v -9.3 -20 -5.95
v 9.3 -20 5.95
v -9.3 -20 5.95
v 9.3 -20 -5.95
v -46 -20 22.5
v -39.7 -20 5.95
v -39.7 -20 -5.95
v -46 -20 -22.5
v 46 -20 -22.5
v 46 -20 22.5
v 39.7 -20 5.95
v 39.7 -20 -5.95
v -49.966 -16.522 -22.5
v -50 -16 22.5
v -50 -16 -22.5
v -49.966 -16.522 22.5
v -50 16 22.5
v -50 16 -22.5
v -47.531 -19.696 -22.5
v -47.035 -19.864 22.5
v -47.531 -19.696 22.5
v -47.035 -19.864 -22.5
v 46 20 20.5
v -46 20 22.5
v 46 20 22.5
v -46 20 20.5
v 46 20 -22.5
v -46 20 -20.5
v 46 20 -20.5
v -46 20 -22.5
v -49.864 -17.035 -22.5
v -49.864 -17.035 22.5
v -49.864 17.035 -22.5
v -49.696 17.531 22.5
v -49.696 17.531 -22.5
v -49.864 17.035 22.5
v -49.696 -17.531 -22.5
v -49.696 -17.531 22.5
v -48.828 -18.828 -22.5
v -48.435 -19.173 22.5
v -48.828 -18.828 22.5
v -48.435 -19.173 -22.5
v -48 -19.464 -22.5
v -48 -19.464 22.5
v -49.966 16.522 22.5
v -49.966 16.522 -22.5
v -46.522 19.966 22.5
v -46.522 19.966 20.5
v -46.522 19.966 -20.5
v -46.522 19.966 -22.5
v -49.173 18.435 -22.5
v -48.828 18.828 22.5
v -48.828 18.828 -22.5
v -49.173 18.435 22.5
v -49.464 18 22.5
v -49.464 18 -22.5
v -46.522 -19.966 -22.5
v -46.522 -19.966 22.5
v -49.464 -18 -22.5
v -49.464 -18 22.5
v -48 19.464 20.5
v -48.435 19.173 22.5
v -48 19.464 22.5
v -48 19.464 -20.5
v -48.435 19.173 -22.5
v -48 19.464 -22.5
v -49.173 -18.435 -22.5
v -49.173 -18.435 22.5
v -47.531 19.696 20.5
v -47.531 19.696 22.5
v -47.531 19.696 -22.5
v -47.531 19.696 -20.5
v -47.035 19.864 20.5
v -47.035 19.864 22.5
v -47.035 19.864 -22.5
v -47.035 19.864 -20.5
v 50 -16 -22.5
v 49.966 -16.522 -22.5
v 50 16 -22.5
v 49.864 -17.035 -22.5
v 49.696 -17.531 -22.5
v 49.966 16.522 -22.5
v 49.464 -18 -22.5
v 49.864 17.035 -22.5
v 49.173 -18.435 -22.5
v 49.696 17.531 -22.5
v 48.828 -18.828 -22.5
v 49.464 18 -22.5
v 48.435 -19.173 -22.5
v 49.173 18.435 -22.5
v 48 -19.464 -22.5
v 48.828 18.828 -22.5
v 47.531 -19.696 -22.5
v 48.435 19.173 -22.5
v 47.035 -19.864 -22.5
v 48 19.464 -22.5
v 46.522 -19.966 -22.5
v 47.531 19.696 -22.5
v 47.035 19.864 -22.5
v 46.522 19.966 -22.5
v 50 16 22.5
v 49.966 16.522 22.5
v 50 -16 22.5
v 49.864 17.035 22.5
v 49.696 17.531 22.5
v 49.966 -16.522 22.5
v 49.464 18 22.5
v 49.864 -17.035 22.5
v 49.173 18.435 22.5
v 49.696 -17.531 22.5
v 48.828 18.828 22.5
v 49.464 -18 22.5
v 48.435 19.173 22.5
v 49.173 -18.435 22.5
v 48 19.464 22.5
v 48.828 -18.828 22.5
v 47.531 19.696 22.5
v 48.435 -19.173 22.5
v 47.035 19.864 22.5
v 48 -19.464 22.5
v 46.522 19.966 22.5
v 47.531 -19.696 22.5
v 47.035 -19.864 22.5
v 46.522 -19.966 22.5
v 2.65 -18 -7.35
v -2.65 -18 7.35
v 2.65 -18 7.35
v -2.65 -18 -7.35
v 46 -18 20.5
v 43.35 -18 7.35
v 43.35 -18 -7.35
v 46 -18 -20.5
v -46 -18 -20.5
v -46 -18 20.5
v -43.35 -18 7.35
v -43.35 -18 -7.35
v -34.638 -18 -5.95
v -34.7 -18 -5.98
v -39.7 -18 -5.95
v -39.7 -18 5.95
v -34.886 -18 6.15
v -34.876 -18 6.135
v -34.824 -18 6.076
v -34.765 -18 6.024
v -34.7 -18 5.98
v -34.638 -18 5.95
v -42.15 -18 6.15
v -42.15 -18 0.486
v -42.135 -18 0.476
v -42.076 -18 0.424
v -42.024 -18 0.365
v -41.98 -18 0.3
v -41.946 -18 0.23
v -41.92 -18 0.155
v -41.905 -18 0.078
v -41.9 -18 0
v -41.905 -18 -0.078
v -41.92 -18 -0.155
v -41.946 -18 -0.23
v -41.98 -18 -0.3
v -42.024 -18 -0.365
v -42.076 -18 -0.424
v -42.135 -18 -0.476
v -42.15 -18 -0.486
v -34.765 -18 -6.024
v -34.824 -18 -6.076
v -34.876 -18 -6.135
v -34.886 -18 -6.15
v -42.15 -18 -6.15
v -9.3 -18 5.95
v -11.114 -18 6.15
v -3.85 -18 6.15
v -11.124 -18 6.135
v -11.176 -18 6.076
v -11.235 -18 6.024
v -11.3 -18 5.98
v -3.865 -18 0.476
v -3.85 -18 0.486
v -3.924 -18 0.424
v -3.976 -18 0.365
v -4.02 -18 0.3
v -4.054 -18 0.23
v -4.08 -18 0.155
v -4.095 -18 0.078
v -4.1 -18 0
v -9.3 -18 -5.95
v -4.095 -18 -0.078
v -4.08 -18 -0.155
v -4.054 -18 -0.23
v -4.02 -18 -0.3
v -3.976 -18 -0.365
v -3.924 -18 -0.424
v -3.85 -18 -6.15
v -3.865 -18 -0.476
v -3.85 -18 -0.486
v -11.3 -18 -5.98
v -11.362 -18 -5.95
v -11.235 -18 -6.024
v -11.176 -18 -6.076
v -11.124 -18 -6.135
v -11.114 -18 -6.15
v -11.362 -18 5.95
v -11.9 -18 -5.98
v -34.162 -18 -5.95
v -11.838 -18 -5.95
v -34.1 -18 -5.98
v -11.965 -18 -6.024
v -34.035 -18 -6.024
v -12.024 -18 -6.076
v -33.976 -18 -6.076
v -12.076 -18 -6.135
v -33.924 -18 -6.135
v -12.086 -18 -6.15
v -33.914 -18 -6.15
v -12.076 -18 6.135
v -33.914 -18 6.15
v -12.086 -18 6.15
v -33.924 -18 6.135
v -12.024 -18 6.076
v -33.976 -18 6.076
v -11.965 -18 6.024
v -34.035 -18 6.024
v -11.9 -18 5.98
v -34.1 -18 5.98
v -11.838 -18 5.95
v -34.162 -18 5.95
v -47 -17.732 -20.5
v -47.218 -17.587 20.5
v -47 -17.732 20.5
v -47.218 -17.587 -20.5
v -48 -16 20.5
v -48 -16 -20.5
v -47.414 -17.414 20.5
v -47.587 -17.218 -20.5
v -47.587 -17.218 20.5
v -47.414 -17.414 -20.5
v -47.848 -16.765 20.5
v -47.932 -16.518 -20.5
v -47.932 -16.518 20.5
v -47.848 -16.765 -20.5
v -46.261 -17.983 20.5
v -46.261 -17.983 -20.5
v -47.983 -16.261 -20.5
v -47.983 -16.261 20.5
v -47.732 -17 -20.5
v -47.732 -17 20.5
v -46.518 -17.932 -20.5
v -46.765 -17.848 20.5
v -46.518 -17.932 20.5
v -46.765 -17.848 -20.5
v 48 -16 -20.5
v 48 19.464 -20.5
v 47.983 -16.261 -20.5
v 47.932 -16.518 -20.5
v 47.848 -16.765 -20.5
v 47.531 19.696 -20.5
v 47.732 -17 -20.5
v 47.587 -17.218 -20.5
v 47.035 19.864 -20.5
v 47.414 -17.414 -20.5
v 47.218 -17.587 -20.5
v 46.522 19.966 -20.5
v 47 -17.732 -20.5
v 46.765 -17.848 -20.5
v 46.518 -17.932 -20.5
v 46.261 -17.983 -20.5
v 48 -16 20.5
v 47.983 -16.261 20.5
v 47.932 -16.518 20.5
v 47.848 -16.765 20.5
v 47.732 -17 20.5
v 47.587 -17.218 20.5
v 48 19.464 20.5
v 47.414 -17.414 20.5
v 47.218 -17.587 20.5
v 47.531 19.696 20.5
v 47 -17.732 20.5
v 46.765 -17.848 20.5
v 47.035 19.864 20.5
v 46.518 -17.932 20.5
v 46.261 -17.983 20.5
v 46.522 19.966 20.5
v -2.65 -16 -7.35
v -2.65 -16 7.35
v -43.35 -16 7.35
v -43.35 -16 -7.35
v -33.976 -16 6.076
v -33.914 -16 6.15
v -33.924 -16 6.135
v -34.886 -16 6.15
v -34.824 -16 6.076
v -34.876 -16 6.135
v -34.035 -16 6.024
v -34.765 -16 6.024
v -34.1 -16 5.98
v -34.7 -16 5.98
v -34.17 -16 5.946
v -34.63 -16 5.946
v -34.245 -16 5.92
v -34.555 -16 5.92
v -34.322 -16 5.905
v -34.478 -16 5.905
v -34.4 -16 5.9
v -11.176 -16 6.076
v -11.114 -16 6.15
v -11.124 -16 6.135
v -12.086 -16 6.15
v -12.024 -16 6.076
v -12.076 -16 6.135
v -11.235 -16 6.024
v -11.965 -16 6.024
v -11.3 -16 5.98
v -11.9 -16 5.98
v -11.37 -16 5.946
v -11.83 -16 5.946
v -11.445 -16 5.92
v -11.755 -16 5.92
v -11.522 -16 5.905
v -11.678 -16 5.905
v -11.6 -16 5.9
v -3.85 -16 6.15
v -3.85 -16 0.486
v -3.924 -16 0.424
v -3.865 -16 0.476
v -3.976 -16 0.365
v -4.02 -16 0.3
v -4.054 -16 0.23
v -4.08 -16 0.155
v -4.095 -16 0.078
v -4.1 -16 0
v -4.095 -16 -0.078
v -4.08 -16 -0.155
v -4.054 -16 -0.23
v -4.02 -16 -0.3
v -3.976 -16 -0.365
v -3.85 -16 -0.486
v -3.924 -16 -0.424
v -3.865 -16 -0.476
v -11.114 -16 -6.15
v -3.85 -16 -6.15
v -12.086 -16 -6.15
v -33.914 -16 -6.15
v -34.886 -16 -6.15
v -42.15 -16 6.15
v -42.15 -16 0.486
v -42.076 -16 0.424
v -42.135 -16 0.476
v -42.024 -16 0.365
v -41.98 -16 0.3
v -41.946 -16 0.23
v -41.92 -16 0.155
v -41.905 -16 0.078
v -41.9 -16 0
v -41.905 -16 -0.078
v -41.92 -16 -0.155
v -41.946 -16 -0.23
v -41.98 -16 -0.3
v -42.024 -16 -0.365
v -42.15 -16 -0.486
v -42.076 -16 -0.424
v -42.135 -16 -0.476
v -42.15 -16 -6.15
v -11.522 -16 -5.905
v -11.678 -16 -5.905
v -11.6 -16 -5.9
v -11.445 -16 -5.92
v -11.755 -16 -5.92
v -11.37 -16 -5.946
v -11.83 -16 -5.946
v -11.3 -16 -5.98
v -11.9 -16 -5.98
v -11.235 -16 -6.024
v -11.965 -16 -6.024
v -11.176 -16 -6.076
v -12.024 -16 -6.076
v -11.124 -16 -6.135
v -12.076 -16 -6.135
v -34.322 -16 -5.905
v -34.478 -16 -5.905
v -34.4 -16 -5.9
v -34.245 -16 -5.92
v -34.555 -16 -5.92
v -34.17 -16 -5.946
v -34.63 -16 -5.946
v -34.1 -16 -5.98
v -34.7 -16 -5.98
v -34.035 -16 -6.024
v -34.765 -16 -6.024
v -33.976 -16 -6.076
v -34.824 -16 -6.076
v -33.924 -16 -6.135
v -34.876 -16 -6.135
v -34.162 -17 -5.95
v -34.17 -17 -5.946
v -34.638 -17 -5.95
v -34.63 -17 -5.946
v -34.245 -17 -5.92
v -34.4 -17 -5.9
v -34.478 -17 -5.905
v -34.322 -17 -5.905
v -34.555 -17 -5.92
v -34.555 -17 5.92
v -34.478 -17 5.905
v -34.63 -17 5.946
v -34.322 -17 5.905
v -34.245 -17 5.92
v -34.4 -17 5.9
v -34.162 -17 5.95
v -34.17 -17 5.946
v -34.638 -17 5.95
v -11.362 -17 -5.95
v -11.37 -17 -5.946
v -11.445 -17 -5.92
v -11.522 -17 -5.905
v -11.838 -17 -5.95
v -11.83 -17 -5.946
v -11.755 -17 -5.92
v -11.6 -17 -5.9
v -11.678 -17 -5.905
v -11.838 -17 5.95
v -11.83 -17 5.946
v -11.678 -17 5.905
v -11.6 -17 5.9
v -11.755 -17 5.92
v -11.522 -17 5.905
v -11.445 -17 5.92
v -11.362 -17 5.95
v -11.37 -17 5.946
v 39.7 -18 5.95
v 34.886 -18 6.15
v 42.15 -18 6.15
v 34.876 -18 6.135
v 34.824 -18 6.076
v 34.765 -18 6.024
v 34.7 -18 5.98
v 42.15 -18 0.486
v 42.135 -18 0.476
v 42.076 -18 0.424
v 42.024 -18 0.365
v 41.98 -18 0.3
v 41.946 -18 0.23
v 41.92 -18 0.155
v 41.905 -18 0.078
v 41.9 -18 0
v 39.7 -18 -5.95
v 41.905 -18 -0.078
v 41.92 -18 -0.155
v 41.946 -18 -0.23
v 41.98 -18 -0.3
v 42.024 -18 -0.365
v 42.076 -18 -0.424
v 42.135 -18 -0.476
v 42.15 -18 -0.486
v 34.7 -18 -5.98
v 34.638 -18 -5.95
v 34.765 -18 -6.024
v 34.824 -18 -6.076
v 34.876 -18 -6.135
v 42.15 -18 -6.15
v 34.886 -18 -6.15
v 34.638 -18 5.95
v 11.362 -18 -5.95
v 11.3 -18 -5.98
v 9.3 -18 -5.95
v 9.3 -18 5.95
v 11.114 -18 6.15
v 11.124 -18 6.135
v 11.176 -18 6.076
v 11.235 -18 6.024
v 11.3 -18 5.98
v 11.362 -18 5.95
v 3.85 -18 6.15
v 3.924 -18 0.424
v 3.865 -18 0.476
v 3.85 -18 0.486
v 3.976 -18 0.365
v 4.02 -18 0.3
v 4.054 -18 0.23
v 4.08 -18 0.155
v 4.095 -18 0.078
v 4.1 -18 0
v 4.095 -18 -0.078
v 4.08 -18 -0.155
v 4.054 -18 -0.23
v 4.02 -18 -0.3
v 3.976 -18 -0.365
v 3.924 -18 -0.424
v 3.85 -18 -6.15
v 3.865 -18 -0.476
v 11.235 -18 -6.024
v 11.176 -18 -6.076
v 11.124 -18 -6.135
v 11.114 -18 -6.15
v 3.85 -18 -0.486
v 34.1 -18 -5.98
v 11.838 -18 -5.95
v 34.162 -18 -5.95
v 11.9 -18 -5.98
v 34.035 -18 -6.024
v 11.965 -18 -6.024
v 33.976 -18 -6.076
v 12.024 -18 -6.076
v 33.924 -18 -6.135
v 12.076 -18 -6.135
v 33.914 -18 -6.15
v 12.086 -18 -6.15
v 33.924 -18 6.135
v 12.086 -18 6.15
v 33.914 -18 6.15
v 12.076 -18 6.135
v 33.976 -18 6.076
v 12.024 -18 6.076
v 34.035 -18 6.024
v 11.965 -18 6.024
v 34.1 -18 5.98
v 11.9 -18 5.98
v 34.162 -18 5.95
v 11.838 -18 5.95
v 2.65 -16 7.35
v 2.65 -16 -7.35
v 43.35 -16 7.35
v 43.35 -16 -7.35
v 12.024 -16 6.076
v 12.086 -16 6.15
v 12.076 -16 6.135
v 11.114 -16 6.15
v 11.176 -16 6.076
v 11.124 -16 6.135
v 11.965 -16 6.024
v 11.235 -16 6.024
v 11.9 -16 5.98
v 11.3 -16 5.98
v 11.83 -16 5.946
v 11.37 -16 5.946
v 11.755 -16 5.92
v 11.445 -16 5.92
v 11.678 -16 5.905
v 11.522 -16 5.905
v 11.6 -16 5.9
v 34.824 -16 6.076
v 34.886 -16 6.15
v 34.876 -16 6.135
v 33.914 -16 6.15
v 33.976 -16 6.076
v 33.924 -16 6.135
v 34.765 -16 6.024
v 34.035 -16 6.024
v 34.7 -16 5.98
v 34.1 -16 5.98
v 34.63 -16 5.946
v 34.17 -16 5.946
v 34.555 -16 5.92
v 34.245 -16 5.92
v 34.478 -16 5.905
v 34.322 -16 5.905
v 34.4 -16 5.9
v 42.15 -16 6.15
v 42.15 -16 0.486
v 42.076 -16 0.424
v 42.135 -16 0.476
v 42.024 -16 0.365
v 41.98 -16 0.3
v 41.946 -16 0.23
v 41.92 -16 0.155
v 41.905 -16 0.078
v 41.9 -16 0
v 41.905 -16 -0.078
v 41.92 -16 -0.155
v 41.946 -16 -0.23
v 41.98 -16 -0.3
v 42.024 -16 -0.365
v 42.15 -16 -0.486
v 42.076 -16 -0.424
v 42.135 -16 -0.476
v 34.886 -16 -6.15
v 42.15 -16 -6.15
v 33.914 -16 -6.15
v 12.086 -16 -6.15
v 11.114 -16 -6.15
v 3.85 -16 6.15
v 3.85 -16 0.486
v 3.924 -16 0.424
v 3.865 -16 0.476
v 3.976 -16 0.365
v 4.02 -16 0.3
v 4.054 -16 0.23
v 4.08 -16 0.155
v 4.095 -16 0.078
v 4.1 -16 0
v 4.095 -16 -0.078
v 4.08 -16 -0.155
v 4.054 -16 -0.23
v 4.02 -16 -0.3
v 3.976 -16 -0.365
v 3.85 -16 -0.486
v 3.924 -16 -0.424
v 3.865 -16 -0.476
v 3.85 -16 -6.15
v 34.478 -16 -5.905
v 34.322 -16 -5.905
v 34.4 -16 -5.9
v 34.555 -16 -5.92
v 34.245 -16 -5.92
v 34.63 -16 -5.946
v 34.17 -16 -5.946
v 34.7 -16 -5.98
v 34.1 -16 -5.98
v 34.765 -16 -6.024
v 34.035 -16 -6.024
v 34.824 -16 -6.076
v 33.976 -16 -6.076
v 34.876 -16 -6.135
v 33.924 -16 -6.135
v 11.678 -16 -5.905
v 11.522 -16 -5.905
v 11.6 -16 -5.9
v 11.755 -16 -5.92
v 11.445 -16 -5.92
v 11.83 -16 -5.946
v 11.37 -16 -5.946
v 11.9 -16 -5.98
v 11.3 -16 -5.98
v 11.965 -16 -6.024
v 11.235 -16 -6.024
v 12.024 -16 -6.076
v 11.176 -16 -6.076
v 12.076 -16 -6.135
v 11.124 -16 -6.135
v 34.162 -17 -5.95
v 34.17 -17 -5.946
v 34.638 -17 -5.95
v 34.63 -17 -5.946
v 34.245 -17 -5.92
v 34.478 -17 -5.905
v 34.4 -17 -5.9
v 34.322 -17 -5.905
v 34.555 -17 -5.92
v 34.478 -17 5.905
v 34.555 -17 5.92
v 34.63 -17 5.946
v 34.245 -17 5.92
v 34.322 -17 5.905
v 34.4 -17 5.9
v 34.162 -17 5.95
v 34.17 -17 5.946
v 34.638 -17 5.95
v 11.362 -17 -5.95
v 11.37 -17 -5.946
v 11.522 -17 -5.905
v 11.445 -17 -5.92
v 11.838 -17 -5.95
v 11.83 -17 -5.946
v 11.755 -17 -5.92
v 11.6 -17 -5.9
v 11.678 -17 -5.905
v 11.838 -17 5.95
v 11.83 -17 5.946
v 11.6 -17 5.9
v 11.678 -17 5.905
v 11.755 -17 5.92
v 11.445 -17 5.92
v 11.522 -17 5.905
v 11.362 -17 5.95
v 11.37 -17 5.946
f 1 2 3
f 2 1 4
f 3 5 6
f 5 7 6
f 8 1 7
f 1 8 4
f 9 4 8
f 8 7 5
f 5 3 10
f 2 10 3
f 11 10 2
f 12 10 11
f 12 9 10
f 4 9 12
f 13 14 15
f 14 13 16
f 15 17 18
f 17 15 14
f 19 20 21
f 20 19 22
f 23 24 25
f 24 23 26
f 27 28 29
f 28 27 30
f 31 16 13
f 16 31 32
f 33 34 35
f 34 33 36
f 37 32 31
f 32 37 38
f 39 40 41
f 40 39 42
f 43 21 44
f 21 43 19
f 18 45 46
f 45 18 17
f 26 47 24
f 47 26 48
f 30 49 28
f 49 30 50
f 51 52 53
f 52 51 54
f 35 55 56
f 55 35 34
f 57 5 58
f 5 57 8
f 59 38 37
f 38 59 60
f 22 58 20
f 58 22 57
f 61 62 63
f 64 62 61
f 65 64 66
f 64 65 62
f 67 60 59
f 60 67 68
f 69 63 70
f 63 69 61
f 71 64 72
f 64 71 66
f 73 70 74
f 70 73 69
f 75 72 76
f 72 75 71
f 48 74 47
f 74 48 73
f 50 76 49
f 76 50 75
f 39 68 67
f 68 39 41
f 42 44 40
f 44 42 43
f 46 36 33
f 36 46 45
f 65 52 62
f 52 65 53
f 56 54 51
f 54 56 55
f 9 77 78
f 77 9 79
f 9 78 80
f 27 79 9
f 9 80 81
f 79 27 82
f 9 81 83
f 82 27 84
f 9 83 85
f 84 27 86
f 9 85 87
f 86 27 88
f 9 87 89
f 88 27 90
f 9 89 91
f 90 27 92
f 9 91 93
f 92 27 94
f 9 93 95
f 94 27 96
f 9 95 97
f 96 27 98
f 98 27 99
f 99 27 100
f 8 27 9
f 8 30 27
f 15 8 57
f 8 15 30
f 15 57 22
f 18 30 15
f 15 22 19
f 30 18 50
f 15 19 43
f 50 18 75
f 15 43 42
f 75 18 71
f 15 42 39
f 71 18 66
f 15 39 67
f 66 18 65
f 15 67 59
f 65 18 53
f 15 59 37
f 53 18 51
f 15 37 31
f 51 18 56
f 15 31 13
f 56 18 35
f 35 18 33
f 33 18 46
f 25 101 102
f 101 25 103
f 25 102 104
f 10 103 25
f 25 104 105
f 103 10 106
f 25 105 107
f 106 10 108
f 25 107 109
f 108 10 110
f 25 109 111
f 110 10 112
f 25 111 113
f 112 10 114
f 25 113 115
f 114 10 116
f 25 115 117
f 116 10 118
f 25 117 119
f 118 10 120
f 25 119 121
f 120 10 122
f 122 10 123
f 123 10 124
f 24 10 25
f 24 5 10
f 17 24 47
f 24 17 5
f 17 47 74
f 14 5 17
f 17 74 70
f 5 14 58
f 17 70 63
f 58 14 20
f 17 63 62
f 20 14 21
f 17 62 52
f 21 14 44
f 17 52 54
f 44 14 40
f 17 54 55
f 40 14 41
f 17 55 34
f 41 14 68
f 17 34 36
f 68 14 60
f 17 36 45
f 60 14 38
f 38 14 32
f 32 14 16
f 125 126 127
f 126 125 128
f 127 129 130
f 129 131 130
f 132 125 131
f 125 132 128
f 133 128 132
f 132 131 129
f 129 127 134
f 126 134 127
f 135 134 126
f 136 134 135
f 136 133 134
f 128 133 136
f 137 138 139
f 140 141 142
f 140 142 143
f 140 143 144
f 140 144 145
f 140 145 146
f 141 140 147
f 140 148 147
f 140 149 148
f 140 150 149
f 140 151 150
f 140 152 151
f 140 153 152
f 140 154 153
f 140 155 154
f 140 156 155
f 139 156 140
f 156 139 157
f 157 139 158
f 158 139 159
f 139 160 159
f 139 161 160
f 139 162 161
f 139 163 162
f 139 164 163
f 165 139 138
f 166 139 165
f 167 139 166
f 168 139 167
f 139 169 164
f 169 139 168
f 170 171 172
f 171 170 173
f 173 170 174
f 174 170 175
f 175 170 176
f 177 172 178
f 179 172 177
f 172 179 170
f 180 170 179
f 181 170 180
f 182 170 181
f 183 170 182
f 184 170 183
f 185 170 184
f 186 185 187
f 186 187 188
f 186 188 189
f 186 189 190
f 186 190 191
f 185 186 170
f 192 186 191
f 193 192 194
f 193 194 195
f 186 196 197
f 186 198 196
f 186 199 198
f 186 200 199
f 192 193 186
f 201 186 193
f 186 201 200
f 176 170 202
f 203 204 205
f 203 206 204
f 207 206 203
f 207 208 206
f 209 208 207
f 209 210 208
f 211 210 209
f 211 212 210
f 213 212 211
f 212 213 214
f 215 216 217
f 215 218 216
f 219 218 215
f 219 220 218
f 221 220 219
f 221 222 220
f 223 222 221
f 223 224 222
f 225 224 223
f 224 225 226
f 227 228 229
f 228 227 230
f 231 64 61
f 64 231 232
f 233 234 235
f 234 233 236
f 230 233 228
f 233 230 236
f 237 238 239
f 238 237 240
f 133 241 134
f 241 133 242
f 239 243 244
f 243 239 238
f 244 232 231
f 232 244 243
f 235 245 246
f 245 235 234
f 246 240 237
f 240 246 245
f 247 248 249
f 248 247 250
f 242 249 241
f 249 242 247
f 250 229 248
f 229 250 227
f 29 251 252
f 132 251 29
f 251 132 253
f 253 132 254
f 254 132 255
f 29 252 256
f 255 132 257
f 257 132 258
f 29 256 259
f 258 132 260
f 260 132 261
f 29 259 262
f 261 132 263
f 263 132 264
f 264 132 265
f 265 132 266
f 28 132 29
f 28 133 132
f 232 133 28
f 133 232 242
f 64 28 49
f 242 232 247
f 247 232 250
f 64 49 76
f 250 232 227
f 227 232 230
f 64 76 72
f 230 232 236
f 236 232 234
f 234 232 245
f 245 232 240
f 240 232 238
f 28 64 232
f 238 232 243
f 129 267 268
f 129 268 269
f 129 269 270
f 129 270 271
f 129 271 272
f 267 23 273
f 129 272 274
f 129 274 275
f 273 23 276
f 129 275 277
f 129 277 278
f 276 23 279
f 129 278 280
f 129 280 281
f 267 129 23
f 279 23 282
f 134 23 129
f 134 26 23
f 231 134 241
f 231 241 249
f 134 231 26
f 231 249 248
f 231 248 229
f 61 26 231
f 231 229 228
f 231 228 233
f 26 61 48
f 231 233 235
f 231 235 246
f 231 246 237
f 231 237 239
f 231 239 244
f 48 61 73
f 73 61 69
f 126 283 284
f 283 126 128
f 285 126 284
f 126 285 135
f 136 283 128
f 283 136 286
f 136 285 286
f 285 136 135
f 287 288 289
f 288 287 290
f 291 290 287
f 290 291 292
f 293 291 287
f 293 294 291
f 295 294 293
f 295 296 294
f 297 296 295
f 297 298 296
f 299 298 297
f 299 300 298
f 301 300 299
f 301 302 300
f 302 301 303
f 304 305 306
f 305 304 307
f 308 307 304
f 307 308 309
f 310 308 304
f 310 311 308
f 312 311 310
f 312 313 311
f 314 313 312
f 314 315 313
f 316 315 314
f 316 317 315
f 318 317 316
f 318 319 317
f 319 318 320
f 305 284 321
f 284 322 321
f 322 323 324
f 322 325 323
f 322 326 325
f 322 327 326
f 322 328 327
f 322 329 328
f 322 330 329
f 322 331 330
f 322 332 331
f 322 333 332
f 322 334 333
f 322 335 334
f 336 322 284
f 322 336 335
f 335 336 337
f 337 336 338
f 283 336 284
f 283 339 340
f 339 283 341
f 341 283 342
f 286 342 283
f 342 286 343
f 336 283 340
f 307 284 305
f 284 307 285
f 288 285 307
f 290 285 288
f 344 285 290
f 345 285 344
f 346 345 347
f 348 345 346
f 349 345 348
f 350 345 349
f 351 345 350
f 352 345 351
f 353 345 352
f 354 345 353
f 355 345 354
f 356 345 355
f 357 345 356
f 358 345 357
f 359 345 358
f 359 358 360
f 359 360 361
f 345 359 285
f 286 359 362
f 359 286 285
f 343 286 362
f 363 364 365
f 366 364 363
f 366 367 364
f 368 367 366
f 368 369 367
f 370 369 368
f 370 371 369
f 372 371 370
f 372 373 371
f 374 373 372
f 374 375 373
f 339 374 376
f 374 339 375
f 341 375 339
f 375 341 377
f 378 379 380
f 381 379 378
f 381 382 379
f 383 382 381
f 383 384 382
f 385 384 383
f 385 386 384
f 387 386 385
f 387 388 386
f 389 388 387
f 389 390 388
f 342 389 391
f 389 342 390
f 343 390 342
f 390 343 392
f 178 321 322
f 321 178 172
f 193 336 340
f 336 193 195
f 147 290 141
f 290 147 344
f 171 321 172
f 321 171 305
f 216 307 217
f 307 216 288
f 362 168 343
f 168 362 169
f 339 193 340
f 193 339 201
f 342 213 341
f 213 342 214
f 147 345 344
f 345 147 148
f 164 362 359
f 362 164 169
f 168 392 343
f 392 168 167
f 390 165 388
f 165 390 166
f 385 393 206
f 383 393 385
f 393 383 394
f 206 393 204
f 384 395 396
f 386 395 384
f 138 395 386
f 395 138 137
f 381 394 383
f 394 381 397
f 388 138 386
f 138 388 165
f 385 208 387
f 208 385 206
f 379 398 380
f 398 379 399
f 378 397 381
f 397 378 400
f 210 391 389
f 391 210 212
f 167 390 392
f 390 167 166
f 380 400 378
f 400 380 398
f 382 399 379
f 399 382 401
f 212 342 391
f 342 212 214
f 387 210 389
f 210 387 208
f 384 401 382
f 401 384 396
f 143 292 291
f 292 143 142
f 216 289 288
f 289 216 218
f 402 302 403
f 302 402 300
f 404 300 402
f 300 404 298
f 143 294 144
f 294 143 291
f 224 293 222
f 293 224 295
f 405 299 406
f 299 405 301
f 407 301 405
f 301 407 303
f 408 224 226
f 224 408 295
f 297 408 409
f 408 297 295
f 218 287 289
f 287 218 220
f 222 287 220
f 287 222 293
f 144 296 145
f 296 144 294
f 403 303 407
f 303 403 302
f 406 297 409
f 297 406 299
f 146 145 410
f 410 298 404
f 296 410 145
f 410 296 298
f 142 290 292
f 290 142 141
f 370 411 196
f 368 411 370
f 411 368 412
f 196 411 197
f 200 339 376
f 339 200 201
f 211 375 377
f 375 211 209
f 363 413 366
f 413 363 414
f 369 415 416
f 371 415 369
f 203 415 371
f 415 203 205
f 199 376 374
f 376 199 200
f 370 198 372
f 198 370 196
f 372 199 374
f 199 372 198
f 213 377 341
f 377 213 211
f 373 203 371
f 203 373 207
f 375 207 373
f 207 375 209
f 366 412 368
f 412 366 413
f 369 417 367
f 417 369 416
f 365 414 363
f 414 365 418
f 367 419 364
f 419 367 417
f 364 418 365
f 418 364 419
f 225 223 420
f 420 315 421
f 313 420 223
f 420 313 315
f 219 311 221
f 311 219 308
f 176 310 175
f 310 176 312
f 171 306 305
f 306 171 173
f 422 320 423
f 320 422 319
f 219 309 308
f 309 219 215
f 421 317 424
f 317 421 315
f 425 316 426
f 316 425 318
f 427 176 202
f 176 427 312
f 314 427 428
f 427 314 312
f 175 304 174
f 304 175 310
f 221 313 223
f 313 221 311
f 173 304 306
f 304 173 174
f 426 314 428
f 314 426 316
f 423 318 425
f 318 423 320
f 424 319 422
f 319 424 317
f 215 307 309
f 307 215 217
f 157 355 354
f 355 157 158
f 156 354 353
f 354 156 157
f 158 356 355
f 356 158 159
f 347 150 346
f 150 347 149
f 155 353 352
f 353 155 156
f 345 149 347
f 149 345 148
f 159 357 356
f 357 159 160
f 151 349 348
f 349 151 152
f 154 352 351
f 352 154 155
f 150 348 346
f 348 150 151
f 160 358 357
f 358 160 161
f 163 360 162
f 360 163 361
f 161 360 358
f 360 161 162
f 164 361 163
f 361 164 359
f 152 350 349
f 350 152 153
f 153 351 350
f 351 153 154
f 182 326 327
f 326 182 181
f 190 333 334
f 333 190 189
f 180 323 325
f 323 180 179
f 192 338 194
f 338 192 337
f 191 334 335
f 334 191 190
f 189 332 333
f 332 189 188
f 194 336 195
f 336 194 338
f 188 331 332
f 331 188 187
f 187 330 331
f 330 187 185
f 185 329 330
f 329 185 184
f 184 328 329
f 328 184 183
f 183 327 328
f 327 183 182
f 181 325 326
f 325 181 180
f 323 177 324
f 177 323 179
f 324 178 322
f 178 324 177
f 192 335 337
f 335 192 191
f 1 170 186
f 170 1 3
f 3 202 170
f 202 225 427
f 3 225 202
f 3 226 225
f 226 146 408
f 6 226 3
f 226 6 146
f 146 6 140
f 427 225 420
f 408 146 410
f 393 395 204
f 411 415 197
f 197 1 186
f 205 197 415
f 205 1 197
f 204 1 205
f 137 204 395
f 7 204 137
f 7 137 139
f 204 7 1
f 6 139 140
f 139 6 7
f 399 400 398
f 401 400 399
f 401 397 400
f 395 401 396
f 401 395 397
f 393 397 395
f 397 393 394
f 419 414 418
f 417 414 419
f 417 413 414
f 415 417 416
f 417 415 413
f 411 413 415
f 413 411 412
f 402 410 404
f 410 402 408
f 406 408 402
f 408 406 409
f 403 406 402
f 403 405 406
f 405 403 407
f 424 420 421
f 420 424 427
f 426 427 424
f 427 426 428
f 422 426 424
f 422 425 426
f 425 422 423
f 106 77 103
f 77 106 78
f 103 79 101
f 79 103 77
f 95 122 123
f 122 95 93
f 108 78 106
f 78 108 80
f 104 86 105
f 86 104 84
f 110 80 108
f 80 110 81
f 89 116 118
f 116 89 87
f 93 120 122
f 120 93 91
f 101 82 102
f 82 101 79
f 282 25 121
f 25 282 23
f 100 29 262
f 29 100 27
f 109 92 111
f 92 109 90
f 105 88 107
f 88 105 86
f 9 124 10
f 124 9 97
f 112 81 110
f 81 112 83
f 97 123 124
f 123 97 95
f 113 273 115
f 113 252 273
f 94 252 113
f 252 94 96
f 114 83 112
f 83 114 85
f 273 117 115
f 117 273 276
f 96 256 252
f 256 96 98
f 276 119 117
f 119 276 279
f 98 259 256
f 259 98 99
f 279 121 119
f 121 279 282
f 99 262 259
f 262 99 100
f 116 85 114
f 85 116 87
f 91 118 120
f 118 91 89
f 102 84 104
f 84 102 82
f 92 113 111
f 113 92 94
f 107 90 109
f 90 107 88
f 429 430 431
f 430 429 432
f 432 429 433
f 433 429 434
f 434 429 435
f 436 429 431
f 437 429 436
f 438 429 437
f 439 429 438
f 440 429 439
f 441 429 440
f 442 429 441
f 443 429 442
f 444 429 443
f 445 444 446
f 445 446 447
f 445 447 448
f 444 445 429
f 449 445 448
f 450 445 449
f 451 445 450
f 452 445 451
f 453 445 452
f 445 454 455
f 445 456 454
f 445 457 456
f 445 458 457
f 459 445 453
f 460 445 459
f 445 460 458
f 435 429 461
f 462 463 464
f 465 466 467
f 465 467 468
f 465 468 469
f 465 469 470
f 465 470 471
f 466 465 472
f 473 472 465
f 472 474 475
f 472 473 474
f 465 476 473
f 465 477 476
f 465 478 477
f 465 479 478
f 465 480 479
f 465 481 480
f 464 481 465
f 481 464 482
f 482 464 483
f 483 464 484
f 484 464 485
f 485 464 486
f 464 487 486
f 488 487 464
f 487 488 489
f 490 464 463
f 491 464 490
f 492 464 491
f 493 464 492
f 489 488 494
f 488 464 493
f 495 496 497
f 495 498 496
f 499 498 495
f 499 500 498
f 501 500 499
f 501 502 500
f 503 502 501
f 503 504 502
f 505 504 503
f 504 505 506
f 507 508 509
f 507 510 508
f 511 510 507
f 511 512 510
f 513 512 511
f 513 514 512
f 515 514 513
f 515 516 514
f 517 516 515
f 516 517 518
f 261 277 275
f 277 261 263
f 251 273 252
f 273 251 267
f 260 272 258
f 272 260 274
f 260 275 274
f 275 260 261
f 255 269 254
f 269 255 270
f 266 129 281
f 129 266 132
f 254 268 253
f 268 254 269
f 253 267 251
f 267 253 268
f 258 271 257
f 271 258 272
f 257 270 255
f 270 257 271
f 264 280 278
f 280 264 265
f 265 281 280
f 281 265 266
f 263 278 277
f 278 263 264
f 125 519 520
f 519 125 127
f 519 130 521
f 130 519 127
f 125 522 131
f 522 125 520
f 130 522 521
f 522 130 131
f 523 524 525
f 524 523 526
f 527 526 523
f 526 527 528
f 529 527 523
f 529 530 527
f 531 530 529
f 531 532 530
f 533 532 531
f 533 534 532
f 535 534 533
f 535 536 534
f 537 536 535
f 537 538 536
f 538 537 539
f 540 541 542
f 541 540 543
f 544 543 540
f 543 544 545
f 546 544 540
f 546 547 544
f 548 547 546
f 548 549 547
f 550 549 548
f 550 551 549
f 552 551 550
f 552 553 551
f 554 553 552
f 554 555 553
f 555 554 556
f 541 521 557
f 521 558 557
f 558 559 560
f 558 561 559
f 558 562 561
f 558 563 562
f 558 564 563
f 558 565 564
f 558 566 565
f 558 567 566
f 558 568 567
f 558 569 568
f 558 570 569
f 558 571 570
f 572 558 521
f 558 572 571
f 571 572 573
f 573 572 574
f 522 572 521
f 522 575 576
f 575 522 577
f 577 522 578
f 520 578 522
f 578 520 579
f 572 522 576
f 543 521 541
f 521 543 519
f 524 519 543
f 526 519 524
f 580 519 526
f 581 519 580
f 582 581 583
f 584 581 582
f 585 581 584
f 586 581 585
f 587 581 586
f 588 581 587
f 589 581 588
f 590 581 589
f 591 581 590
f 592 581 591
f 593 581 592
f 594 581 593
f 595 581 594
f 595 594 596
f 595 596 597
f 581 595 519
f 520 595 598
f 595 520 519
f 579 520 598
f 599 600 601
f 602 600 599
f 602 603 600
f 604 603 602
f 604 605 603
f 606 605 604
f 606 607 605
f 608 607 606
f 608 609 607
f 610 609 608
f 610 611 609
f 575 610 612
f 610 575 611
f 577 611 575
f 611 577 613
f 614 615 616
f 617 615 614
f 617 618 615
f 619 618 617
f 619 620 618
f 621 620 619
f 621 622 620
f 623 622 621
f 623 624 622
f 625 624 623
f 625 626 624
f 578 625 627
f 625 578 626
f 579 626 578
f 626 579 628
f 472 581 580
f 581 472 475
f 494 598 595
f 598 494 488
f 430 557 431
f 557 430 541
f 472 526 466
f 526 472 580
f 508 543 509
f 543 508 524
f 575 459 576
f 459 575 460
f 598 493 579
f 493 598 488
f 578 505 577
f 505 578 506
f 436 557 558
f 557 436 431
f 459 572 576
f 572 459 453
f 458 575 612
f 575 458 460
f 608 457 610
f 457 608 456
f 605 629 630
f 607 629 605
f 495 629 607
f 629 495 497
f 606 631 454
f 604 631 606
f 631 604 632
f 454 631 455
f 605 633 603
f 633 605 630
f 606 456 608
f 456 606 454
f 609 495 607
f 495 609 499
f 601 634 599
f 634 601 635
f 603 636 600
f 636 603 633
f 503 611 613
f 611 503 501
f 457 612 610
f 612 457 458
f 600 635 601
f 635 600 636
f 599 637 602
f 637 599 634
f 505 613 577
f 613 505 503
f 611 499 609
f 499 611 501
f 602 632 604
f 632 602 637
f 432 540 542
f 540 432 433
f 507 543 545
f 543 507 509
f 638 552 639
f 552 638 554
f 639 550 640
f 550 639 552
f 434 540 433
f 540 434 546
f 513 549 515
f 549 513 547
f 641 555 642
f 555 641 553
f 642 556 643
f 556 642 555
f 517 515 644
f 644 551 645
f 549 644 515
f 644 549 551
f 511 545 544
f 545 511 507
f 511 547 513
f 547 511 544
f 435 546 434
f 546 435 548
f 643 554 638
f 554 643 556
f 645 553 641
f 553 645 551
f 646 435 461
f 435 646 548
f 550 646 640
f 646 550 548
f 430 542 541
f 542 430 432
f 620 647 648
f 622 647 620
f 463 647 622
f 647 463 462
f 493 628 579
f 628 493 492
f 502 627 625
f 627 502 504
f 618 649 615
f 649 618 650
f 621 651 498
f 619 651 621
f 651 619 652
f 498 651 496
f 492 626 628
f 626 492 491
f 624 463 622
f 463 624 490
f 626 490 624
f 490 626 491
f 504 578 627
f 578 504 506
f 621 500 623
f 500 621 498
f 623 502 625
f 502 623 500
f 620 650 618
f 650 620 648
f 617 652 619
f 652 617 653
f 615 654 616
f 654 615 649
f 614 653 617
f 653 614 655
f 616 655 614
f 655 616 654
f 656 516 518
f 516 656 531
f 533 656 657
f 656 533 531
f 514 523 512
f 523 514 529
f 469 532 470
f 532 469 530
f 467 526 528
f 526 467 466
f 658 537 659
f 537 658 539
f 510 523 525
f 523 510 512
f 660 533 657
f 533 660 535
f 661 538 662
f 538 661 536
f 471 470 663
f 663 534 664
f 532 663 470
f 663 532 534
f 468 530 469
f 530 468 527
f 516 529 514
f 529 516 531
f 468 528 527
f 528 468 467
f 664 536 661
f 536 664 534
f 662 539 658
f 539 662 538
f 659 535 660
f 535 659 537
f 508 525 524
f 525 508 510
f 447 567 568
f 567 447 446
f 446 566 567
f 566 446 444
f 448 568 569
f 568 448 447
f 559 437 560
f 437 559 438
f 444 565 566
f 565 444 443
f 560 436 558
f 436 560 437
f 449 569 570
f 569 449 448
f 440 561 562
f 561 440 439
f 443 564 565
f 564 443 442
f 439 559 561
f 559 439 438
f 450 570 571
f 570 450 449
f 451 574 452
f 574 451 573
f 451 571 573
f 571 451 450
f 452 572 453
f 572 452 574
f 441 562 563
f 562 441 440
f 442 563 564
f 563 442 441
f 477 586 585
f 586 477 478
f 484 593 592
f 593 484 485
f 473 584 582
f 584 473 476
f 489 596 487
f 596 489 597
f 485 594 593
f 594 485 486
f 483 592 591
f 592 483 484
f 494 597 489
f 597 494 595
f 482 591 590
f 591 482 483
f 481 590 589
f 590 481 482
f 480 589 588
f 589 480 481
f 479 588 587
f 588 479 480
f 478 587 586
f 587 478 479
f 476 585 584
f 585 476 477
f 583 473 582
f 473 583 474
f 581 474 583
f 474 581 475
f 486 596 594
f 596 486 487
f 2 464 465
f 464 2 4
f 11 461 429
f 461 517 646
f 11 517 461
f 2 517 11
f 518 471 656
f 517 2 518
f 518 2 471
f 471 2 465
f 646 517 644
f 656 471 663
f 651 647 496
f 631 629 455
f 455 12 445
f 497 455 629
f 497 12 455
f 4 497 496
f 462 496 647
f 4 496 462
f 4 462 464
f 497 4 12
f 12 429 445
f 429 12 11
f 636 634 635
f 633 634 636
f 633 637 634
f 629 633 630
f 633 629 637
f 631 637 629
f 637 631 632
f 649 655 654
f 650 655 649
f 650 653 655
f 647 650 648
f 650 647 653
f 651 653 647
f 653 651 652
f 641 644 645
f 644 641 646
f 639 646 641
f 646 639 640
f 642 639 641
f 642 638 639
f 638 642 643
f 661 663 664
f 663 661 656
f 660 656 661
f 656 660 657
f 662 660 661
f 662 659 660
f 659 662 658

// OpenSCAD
// DANTE case, step 1: a box with two press-fit windows for 0.91" SSD1306 128x32 OLEDs.
// All sizes in mm. Measure your modules with calipers and adjust the OLED block if they differ.
// The box is open at the back (a lid comes later). The front wall faces -Y.

/* [Box] */
box_w     = 100;   // outside width  (X)
box_h     = 45;    // outside height (Z)
box_d     = 40;    // outside depth  (Y)
wall      = 2.0;   // side/top/bottom walls
front     = 2.0;   // front wall thickness (glass is 1.4, so it sits ~0.6 behind the face)
corner_r  = 4;     // outside corner radius
eye_pitch = 46;    // centre-to-centre distance between the two screens
eye_z     = 0;     // vertical offset of the screens from the box centre

/* [OLED module: common 0.91" 128x32] */
pcb_w     = 38.0;  // PCB length (header end included)
pcb_h     = 12.0;  // PCB height
pcb_t     = 1.2;   // PCB thickness
glass_w   = 30.0;  // glass panel width
glass_h   = 11.5;  // glass panel height
glass_x   = -1.5;  // glass centre offset from PCB centre (away from the 4-pin header)

/* [Fit] */
window_clear = 0.20; // per side, glass to window: the glass never takes load
press        = 0.10; // interference per side on the PCB (0.05 tighter printers, 0.15 looser)
rib_w        = 1.2;  // retaining frame wall
rib_depth    = 2.0;  // frame height behind the front wall (≥ pcb_t)
bump_r       = 0.6;  // crush-bump radius on the frame (the part that actually grips)

$fn = 48;

module rounded_box(w, d, h, r) {
    hull() for (x = [-w/2 + r, w/2 - r], y = [-d/2 + r, d/2 - r])
        translate([x, y, -h/2]) cylinder(r = r, h = h);
}

// Shell: closed front, open back.
module shell() {
    difference() {
        rounded_box(box_w, box_d, box_h, corner_r);
        translate([0, front, 0])
            rounded_box(box_w - 2*wall, box_d, box_h - 2*wall, max(corner_r - wall, 0.5));
    }
}

// Glass window through the front wall, for one screen centred at x = cx.
module window_cut(cx) {
    translate([cx + glass_x - glass_w/2 - window_clear, -box_d/2 - 1,
               eye_z - glass_h/2 - window_clear])
        cube([glass_w + 2*window_clear, front + 2, glass_h + 2*window_clear]);
}

// Frame behind the front wall. The pocket is the PCB size plus a small gap, and
// half-round crush bumps reach into it by `press`, so the PCB snaps in and is held by friction.
module press_frame(cx) {
    gap = 0.15;                       // pocket clearance so only the bumps touch
    iw = pcb_w + 2*gap;  ih = pcb_h + 2*gap;
    y0 = -box_d/2 + front;            // inside face of the front wall
    translate([cx, y0, eye_z]) {
        difference() {
            translate([-iw/2 - rib_w, 0, -ih/2 - rib_w]) cube([iw + 2*rib_w, rib_depth, ih + 2*rib_w]);
            translate([-iw/2, -0.1, -ih/2]) cube([iw, rib_depth + 1, ih]);
        }
        // crush bumps: two on each long side, one on each short side
        bump_in = gap + press;
        for (fx = [-0.3, 0.3])
            for (sz = [-1, 1])
                translate([fx * pcb_w, 0, sz * (ih/2 + bump_r - bump_in)])
                    rotate([-90, 0, 0]) cylinder(r = bump_r, h = rib_depth);
        for (sx = [-1, 1])
            translate([sx * (iw/2 + bump_r - bump_in), 0, 0])
                rotate([-90, 0, 0]) cylinder(r = bump_r, h = rib_depth);
    }
}

module case_body() {
    difference() {
        union() {
            shell();
            for (s = [-1, 1]) press_frame(s * eye_pitch/2);
        }
        for (s = [-1, 1]) window_cut(s * eye_pitch/2);
    }
}

// Mirror the right screen so both 4-pin headers point toward the middle of the box (shorter wires).
// Set to false if you want both modules the same way round.
mirror_right = true;

if (mirror_right) {
    // left half as modelled, right half mirrored
    intersection() { case_body(); translate([-box_w, -box_d, -box_h]) cube([box_w, 2*box_d, 2*box_h]); }
    mirror([1, 0, 0])
    intersection() { case_body(); translate([-box_w, -box_d, -box_h]) cube([box_w, 2*box_d, 2*box_h]); }
} else {
    case_body();
}
